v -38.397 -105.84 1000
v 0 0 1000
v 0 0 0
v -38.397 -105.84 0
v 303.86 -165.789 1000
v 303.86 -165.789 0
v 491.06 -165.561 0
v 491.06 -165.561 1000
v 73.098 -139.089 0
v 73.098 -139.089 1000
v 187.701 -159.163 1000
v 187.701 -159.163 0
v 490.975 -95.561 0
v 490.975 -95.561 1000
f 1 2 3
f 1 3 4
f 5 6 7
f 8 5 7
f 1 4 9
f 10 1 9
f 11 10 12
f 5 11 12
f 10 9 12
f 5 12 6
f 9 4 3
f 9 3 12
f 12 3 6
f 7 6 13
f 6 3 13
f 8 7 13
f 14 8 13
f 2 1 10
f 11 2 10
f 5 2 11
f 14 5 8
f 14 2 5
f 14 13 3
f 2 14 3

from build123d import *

# Parameters (mm, degrees)
F3_DEPTH = 1000


with BuildPart() as f3:
    # F2 (on face) → F3 (new body)
    with BuildSketch(Plane.XY):
        with BuildLine():
            Line((303.86036, -165.789379), (491.060221, -165.560671))
            Line((491.060221, -165.560671), (490.9747, -95.560723))
            Line((490.9747, -95.560723), (0, 0))
            Line((0, 0), (-38.397282, -105.840393))
            ThreePointArc((-38.397282, -105.840393), (130.107793, -150.794242), (303.86036, -165.789379))
        make_face()
    extrude(amount=F3_DEPTH)


solid = f3.part
